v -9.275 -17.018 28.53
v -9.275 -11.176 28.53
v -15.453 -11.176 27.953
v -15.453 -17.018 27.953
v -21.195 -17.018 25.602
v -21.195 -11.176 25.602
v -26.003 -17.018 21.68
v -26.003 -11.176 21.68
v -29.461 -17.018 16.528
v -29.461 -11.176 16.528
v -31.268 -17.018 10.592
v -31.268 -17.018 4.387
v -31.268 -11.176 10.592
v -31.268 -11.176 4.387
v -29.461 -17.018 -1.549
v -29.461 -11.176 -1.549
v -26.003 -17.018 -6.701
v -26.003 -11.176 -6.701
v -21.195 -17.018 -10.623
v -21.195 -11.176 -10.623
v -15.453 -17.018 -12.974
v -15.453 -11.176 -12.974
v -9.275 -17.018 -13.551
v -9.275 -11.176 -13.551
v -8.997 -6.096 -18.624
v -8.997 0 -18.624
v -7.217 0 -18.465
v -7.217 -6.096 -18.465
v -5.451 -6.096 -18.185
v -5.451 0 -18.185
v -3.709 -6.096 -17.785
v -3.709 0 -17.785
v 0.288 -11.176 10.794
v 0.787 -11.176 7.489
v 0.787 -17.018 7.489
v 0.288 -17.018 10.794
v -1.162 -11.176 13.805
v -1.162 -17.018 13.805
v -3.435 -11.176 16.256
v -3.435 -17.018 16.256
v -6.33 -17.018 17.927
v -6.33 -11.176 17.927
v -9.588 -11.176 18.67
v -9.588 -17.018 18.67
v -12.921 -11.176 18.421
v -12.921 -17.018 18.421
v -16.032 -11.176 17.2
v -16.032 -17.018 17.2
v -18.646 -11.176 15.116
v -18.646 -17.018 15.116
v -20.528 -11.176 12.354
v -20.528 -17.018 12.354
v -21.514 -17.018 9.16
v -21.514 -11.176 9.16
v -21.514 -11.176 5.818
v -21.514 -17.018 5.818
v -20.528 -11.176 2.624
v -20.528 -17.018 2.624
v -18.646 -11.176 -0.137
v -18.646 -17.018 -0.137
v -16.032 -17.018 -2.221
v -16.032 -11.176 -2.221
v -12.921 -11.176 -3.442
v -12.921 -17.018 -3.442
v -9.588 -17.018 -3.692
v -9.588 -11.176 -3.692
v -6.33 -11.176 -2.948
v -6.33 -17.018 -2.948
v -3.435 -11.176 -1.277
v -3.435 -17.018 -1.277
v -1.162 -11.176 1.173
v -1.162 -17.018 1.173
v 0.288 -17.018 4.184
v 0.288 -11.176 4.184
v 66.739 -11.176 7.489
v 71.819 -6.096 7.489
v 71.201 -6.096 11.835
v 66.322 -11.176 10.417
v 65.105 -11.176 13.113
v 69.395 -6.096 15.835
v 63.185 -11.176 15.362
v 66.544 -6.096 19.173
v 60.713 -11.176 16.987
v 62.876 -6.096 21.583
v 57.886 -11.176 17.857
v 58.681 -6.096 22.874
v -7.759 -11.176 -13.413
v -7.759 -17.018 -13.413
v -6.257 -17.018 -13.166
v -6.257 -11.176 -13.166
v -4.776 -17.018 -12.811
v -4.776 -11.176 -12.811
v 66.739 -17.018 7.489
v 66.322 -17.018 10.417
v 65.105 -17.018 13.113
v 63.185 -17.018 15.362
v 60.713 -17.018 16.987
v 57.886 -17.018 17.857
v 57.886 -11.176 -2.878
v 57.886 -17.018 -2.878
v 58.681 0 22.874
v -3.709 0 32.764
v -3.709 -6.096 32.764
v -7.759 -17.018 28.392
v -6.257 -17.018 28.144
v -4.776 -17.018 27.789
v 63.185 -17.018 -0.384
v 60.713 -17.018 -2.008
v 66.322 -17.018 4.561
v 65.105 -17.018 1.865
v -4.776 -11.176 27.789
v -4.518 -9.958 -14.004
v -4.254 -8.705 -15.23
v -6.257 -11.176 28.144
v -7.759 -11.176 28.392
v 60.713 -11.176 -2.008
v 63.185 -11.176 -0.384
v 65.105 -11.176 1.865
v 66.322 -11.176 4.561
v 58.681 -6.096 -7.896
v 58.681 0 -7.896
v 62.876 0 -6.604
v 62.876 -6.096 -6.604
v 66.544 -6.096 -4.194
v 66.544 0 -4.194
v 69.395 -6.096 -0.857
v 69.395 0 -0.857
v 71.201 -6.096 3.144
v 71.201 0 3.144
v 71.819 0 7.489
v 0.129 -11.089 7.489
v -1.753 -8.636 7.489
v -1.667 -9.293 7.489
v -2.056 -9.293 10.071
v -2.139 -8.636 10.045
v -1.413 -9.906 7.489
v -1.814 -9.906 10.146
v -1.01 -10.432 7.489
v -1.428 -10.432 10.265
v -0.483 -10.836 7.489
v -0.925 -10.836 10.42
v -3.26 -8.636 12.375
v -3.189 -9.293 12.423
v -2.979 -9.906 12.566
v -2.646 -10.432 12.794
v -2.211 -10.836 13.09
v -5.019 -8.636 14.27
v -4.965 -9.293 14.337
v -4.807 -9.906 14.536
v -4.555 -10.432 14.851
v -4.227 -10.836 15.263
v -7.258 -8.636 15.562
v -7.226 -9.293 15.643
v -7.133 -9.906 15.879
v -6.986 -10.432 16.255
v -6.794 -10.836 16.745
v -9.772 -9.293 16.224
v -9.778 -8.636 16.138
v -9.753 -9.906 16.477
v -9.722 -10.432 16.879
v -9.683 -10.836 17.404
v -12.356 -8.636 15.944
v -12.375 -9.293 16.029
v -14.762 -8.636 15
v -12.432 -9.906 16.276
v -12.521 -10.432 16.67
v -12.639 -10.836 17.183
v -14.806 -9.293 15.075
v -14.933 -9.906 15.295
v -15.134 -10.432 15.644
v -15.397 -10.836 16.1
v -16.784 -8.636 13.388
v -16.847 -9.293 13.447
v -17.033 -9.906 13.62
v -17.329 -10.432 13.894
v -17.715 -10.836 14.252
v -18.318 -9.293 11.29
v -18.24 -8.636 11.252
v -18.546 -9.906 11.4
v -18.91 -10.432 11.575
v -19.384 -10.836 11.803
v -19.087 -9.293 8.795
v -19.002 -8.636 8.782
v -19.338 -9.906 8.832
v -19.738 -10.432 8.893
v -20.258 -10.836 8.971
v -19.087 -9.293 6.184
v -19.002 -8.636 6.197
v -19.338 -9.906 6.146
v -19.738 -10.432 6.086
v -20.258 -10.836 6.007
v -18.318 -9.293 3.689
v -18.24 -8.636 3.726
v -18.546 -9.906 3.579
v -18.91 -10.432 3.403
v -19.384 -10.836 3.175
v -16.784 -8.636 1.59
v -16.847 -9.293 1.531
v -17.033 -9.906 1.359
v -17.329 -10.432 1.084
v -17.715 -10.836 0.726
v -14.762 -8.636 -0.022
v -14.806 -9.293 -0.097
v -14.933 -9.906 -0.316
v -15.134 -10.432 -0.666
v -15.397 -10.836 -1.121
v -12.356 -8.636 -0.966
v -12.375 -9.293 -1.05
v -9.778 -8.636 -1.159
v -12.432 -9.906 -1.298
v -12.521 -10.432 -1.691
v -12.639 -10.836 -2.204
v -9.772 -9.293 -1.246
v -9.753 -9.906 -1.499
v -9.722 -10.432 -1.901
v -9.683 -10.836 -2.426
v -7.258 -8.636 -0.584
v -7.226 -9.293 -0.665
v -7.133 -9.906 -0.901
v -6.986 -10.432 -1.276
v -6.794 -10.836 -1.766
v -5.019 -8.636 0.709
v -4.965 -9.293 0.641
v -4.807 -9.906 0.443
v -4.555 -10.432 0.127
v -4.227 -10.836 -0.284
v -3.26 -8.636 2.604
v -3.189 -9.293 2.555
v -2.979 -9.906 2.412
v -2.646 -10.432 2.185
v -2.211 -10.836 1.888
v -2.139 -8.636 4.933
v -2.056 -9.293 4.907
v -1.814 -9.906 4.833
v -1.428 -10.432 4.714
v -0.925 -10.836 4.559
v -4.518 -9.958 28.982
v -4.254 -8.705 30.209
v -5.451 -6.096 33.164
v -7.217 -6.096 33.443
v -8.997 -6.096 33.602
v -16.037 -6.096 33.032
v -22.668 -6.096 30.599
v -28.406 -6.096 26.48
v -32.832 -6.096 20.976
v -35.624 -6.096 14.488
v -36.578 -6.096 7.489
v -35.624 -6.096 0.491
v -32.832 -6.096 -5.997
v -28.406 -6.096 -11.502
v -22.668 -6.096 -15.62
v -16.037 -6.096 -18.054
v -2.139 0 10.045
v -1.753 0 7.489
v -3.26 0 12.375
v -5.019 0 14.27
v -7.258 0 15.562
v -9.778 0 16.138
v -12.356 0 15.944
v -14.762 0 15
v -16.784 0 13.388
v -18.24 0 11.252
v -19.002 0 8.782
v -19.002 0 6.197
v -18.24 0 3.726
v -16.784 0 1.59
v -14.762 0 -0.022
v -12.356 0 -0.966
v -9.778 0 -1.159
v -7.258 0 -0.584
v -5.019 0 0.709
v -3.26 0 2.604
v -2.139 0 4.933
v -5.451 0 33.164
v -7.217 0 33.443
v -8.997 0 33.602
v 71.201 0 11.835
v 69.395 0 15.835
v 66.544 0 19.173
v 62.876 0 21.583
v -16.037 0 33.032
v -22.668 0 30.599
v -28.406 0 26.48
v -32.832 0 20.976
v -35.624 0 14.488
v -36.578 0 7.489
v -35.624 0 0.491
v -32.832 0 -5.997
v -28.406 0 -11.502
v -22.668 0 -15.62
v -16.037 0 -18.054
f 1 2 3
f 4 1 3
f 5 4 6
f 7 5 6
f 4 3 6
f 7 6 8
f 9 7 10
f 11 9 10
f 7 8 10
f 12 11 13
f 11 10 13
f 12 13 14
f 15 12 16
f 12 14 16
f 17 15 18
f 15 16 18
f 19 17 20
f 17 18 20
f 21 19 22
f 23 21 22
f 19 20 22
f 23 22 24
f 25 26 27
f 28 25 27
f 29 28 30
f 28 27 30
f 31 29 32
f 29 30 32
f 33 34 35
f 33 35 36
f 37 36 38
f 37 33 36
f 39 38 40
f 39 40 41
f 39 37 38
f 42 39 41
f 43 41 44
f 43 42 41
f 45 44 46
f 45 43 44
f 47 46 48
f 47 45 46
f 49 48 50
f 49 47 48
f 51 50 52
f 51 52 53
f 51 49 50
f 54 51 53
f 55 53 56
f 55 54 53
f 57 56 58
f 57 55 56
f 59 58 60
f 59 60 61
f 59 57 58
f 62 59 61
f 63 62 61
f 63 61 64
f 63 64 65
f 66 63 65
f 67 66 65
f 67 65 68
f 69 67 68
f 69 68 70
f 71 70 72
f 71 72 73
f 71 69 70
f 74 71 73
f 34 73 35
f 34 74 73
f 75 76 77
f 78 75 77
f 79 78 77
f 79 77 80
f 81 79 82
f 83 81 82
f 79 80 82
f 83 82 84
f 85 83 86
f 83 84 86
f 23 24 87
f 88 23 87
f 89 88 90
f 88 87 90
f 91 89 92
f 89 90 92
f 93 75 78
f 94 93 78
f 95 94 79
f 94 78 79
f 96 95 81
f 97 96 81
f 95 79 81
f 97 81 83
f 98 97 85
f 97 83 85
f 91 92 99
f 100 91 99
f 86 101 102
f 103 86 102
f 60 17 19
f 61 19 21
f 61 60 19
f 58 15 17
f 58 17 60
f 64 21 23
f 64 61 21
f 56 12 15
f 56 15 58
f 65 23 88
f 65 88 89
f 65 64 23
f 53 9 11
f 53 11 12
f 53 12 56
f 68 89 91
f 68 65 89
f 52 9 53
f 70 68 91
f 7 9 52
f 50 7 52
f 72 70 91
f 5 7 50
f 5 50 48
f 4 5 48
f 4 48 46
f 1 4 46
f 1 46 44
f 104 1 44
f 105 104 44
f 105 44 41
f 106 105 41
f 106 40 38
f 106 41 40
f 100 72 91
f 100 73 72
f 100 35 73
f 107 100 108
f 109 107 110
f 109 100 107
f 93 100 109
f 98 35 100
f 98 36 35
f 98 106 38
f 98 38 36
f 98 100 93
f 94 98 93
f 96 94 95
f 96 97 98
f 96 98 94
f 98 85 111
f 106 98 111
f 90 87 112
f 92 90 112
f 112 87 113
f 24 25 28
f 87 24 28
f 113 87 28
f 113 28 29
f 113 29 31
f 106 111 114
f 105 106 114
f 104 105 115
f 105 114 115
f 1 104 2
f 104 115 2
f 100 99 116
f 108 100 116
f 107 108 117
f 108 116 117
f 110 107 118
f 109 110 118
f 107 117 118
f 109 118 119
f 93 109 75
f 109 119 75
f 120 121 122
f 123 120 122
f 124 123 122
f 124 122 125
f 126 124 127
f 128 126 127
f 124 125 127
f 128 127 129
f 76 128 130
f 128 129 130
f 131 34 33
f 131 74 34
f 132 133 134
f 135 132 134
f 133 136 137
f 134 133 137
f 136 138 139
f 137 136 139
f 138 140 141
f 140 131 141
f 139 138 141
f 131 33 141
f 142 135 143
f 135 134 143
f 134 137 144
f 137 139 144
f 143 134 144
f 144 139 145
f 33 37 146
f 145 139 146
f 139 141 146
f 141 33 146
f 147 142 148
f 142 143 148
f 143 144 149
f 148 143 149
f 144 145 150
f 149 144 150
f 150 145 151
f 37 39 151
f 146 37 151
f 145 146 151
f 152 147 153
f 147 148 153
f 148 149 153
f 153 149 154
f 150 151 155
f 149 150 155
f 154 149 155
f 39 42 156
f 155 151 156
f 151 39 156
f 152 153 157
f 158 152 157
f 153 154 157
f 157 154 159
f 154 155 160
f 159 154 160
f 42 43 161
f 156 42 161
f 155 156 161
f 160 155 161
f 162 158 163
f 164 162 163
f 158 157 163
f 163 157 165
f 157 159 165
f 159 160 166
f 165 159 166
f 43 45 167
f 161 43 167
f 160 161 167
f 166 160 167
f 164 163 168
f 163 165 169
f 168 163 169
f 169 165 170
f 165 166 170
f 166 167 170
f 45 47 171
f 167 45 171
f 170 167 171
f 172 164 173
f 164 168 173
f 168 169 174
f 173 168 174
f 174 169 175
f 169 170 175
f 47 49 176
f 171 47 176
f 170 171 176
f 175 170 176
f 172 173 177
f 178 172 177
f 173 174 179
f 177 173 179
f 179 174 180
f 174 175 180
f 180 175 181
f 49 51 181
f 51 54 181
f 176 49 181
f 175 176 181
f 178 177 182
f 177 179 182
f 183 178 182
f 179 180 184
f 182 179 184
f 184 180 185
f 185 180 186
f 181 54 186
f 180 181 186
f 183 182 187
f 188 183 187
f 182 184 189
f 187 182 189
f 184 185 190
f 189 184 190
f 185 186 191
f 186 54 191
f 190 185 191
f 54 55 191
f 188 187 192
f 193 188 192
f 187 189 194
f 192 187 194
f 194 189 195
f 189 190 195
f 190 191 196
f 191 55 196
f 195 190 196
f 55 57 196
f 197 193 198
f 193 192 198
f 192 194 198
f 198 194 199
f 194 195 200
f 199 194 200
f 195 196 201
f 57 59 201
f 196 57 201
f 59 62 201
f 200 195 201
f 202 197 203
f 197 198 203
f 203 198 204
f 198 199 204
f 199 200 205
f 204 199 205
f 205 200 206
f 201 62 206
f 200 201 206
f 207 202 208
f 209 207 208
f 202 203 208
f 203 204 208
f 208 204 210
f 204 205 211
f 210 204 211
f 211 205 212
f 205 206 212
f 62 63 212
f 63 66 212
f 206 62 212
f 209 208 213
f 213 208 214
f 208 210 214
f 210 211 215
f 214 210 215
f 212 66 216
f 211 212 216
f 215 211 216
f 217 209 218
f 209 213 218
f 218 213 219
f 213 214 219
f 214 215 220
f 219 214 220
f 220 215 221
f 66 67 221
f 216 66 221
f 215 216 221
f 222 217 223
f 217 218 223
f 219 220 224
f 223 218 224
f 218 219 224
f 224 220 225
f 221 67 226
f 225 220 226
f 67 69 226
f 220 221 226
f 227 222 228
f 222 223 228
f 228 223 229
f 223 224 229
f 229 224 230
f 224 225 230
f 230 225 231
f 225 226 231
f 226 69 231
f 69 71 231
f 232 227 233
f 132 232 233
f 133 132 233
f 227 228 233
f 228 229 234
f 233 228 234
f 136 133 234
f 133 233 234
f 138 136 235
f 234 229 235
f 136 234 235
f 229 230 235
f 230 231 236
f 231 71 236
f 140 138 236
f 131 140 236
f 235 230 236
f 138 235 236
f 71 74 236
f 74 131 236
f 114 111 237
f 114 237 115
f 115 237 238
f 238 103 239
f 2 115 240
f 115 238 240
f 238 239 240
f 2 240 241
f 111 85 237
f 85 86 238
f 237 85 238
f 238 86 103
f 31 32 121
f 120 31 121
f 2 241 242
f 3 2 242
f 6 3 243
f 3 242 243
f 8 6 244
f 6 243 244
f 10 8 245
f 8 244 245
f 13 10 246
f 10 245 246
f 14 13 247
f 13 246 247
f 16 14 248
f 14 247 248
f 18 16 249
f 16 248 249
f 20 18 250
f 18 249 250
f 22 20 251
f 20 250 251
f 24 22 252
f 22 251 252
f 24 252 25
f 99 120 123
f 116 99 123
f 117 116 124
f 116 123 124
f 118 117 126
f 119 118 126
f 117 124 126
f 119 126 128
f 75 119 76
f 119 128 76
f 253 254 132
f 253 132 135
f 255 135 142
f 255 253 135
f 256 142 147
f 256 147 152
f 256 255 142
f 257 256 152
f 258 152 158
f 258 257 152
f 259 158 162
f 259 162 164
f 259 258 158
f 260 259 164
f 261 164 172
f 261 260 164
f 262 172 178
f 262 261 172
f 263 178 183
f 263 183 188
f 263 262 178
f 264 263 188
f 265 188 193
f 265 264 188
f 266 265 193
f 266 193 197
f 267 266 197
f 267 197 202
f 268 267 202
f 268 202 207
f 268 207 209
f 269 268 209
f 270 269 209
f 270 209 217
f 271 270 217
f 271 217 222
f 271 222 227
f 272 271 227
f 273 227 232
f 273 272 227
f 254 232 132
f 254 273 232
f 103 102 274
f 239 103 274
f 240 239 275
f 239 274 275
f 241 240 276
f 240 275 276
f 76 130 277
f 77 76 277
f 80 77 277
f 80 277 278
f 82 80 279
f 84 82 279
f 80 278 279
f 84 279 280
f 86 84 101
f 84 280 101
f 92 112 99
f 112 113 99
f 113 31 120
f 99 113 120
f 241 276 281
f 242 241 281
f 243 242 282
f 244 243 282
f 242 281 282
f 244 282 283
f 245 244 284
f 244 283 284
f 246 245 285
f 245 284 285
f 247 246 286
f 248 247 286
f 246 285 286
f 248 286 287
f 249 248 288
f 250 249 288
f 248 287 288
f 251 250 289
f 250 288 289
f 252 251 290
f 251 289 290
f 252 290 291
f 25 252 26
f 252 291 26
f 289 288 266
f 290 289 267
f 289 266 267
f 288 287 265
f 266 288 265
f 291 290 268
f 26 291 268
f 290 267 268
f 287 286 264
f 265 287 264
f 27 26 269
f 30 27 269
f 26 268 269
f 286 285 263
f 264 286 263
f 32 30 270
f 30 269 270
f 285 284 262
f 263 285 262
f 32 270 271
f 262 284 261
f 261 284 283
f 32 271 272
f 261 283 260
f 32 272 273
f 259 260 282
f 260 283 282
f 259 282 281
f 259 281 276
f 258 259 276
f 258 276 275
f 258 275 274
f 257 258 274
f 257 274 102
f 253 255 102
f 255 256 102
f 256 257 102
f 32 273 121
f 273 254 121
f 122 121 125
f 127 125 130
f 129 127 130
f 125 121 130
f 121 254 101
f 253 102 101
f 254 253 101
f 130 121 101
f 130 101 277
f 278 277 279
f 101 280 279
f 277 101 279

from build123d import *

# Parameters (mm, degrees)
F0_R     = 8.6726561419
F1_DEPTH = 11.176
F2_R     = 2.54
F3_SIZE  = 5.08
F4_DEPTH = 5.842


with BuildPart() as f1:
    # F0 (on Front) → F1 (new body)
    with BuildSketch(Plane.XZ):
        with BuildLine():
            ThreePointArc((-3.7094716517, 32.7638350621), (-6.3317193926, 33.3185695674), (-8.9969745918, 33.6019920596))
            Line((-8.9969745918, 33.6019920596), (-3.7094716517, 32.7638350621))
        make_face()
        with BuildLine():
            Line((-3.7094716517, -17.7854802654), (-8.9969745918, -18.6236372628))
            ThreePointArc((-8.9969745918, -18.6236372628), (-6.3317193926, -18.3402147707), (-3.7094716517, -17.7854802654))
        make_face()
        with BuildLine():
            Line((58.6809857184, 22.8739117825), (-3.7094716517, 32.7638350621))
            ThreePointArc((-3.7094716517, 32.7638350621), (10.3052007911, 23.4307705289), (15.7257861582, 7.4891773984))
            ThreePointArc((15.7257861582, 7.4891773984), (10.3052007911, -8.4524157321), (-3.7094716517, -17.7854802654))
            Line((-3.7094716517, -17.7854802654), (58.6809857184, -7.8955569857))
            ThreePointArc((58.6809857184, -7.8955569857), (40.6654246701, 7.4891773984), (58.6809857184, 22.8739117825))
        make_face()
        with BuildLine():
            ThreePointArc((71.819075142, 7.4891773984), (68.087612838, 17.6047525893), (58.6809857184, 22.8739117825))
            ThreePointArc((58.6809857184, 22.8739117825), (40.6654246701, 7.4891773984), (58.6809857184, -7.8955569857))
            ThreePointArc((58.6809857184, -7.8955569857), (68.087612838, -2.6263977925), (71.819075142, 7.4891773984))
        make_face()
        with BuildLine():
            Line((-3.7094716517, 32.7638350621), (-8.9969745918, 33.6019920596))
            ThreePointArc((-8.9969745918, 33.6019920596), (-36.5779998836, 7.4891773984), (-8.9969745918, -18.6236372628))
            Line((-8.9969745918, -18.6236372628), (-3.7094716517, -17.7854802654))
            ThreePointArc((-3.7094716517, -17.7854802654), (10.3052007911, -8.4524157321), (15.7257861582, 7.4891773984))
            ThreePointArc((15.7257861582, 7.4891773984), (10.3052007911, 23.4307705289), (-3.7094716517, 32.7638350621))
        make_face()
        with Locations((-10.4261068627, 7.4891773984)):
            Circle(F0_R, mode=Mode.SUBTRACT)
    extrude(amount=F1_DEPTH)

    # F2
    f2_edges = [f1.edges().sort_by_distance(p)[0] for p in [
        (-19.098763, -11.176, 7.489177),
    ]]
    fillet(f2_edges, radius=F2_R)

    # F3
    f3_edges = [f1.edges().sort_by_distance(p)[0] for p in [
        (27.485757, -11.176, -12.840519),
        (-21.638763, -11.176, 7.489177),
        (-36.578, -11.176, 7.489177),
        (71.819075, -11.176, 7.489177),
        (27.485757, -11.176, 27.818873),
    ]]
    chamfer(f3_edges, length=F3_SIZE)

    # F4 (add): a face of the model
    f4_faces = [f1.faces().sort_by_distance(p)[0] for p in [
        (16.1234060629, -11.176, 7.4891773984),
    ]]
    extrude(f4_faces, amount=F4_DEPTH)


solid = f1.part
